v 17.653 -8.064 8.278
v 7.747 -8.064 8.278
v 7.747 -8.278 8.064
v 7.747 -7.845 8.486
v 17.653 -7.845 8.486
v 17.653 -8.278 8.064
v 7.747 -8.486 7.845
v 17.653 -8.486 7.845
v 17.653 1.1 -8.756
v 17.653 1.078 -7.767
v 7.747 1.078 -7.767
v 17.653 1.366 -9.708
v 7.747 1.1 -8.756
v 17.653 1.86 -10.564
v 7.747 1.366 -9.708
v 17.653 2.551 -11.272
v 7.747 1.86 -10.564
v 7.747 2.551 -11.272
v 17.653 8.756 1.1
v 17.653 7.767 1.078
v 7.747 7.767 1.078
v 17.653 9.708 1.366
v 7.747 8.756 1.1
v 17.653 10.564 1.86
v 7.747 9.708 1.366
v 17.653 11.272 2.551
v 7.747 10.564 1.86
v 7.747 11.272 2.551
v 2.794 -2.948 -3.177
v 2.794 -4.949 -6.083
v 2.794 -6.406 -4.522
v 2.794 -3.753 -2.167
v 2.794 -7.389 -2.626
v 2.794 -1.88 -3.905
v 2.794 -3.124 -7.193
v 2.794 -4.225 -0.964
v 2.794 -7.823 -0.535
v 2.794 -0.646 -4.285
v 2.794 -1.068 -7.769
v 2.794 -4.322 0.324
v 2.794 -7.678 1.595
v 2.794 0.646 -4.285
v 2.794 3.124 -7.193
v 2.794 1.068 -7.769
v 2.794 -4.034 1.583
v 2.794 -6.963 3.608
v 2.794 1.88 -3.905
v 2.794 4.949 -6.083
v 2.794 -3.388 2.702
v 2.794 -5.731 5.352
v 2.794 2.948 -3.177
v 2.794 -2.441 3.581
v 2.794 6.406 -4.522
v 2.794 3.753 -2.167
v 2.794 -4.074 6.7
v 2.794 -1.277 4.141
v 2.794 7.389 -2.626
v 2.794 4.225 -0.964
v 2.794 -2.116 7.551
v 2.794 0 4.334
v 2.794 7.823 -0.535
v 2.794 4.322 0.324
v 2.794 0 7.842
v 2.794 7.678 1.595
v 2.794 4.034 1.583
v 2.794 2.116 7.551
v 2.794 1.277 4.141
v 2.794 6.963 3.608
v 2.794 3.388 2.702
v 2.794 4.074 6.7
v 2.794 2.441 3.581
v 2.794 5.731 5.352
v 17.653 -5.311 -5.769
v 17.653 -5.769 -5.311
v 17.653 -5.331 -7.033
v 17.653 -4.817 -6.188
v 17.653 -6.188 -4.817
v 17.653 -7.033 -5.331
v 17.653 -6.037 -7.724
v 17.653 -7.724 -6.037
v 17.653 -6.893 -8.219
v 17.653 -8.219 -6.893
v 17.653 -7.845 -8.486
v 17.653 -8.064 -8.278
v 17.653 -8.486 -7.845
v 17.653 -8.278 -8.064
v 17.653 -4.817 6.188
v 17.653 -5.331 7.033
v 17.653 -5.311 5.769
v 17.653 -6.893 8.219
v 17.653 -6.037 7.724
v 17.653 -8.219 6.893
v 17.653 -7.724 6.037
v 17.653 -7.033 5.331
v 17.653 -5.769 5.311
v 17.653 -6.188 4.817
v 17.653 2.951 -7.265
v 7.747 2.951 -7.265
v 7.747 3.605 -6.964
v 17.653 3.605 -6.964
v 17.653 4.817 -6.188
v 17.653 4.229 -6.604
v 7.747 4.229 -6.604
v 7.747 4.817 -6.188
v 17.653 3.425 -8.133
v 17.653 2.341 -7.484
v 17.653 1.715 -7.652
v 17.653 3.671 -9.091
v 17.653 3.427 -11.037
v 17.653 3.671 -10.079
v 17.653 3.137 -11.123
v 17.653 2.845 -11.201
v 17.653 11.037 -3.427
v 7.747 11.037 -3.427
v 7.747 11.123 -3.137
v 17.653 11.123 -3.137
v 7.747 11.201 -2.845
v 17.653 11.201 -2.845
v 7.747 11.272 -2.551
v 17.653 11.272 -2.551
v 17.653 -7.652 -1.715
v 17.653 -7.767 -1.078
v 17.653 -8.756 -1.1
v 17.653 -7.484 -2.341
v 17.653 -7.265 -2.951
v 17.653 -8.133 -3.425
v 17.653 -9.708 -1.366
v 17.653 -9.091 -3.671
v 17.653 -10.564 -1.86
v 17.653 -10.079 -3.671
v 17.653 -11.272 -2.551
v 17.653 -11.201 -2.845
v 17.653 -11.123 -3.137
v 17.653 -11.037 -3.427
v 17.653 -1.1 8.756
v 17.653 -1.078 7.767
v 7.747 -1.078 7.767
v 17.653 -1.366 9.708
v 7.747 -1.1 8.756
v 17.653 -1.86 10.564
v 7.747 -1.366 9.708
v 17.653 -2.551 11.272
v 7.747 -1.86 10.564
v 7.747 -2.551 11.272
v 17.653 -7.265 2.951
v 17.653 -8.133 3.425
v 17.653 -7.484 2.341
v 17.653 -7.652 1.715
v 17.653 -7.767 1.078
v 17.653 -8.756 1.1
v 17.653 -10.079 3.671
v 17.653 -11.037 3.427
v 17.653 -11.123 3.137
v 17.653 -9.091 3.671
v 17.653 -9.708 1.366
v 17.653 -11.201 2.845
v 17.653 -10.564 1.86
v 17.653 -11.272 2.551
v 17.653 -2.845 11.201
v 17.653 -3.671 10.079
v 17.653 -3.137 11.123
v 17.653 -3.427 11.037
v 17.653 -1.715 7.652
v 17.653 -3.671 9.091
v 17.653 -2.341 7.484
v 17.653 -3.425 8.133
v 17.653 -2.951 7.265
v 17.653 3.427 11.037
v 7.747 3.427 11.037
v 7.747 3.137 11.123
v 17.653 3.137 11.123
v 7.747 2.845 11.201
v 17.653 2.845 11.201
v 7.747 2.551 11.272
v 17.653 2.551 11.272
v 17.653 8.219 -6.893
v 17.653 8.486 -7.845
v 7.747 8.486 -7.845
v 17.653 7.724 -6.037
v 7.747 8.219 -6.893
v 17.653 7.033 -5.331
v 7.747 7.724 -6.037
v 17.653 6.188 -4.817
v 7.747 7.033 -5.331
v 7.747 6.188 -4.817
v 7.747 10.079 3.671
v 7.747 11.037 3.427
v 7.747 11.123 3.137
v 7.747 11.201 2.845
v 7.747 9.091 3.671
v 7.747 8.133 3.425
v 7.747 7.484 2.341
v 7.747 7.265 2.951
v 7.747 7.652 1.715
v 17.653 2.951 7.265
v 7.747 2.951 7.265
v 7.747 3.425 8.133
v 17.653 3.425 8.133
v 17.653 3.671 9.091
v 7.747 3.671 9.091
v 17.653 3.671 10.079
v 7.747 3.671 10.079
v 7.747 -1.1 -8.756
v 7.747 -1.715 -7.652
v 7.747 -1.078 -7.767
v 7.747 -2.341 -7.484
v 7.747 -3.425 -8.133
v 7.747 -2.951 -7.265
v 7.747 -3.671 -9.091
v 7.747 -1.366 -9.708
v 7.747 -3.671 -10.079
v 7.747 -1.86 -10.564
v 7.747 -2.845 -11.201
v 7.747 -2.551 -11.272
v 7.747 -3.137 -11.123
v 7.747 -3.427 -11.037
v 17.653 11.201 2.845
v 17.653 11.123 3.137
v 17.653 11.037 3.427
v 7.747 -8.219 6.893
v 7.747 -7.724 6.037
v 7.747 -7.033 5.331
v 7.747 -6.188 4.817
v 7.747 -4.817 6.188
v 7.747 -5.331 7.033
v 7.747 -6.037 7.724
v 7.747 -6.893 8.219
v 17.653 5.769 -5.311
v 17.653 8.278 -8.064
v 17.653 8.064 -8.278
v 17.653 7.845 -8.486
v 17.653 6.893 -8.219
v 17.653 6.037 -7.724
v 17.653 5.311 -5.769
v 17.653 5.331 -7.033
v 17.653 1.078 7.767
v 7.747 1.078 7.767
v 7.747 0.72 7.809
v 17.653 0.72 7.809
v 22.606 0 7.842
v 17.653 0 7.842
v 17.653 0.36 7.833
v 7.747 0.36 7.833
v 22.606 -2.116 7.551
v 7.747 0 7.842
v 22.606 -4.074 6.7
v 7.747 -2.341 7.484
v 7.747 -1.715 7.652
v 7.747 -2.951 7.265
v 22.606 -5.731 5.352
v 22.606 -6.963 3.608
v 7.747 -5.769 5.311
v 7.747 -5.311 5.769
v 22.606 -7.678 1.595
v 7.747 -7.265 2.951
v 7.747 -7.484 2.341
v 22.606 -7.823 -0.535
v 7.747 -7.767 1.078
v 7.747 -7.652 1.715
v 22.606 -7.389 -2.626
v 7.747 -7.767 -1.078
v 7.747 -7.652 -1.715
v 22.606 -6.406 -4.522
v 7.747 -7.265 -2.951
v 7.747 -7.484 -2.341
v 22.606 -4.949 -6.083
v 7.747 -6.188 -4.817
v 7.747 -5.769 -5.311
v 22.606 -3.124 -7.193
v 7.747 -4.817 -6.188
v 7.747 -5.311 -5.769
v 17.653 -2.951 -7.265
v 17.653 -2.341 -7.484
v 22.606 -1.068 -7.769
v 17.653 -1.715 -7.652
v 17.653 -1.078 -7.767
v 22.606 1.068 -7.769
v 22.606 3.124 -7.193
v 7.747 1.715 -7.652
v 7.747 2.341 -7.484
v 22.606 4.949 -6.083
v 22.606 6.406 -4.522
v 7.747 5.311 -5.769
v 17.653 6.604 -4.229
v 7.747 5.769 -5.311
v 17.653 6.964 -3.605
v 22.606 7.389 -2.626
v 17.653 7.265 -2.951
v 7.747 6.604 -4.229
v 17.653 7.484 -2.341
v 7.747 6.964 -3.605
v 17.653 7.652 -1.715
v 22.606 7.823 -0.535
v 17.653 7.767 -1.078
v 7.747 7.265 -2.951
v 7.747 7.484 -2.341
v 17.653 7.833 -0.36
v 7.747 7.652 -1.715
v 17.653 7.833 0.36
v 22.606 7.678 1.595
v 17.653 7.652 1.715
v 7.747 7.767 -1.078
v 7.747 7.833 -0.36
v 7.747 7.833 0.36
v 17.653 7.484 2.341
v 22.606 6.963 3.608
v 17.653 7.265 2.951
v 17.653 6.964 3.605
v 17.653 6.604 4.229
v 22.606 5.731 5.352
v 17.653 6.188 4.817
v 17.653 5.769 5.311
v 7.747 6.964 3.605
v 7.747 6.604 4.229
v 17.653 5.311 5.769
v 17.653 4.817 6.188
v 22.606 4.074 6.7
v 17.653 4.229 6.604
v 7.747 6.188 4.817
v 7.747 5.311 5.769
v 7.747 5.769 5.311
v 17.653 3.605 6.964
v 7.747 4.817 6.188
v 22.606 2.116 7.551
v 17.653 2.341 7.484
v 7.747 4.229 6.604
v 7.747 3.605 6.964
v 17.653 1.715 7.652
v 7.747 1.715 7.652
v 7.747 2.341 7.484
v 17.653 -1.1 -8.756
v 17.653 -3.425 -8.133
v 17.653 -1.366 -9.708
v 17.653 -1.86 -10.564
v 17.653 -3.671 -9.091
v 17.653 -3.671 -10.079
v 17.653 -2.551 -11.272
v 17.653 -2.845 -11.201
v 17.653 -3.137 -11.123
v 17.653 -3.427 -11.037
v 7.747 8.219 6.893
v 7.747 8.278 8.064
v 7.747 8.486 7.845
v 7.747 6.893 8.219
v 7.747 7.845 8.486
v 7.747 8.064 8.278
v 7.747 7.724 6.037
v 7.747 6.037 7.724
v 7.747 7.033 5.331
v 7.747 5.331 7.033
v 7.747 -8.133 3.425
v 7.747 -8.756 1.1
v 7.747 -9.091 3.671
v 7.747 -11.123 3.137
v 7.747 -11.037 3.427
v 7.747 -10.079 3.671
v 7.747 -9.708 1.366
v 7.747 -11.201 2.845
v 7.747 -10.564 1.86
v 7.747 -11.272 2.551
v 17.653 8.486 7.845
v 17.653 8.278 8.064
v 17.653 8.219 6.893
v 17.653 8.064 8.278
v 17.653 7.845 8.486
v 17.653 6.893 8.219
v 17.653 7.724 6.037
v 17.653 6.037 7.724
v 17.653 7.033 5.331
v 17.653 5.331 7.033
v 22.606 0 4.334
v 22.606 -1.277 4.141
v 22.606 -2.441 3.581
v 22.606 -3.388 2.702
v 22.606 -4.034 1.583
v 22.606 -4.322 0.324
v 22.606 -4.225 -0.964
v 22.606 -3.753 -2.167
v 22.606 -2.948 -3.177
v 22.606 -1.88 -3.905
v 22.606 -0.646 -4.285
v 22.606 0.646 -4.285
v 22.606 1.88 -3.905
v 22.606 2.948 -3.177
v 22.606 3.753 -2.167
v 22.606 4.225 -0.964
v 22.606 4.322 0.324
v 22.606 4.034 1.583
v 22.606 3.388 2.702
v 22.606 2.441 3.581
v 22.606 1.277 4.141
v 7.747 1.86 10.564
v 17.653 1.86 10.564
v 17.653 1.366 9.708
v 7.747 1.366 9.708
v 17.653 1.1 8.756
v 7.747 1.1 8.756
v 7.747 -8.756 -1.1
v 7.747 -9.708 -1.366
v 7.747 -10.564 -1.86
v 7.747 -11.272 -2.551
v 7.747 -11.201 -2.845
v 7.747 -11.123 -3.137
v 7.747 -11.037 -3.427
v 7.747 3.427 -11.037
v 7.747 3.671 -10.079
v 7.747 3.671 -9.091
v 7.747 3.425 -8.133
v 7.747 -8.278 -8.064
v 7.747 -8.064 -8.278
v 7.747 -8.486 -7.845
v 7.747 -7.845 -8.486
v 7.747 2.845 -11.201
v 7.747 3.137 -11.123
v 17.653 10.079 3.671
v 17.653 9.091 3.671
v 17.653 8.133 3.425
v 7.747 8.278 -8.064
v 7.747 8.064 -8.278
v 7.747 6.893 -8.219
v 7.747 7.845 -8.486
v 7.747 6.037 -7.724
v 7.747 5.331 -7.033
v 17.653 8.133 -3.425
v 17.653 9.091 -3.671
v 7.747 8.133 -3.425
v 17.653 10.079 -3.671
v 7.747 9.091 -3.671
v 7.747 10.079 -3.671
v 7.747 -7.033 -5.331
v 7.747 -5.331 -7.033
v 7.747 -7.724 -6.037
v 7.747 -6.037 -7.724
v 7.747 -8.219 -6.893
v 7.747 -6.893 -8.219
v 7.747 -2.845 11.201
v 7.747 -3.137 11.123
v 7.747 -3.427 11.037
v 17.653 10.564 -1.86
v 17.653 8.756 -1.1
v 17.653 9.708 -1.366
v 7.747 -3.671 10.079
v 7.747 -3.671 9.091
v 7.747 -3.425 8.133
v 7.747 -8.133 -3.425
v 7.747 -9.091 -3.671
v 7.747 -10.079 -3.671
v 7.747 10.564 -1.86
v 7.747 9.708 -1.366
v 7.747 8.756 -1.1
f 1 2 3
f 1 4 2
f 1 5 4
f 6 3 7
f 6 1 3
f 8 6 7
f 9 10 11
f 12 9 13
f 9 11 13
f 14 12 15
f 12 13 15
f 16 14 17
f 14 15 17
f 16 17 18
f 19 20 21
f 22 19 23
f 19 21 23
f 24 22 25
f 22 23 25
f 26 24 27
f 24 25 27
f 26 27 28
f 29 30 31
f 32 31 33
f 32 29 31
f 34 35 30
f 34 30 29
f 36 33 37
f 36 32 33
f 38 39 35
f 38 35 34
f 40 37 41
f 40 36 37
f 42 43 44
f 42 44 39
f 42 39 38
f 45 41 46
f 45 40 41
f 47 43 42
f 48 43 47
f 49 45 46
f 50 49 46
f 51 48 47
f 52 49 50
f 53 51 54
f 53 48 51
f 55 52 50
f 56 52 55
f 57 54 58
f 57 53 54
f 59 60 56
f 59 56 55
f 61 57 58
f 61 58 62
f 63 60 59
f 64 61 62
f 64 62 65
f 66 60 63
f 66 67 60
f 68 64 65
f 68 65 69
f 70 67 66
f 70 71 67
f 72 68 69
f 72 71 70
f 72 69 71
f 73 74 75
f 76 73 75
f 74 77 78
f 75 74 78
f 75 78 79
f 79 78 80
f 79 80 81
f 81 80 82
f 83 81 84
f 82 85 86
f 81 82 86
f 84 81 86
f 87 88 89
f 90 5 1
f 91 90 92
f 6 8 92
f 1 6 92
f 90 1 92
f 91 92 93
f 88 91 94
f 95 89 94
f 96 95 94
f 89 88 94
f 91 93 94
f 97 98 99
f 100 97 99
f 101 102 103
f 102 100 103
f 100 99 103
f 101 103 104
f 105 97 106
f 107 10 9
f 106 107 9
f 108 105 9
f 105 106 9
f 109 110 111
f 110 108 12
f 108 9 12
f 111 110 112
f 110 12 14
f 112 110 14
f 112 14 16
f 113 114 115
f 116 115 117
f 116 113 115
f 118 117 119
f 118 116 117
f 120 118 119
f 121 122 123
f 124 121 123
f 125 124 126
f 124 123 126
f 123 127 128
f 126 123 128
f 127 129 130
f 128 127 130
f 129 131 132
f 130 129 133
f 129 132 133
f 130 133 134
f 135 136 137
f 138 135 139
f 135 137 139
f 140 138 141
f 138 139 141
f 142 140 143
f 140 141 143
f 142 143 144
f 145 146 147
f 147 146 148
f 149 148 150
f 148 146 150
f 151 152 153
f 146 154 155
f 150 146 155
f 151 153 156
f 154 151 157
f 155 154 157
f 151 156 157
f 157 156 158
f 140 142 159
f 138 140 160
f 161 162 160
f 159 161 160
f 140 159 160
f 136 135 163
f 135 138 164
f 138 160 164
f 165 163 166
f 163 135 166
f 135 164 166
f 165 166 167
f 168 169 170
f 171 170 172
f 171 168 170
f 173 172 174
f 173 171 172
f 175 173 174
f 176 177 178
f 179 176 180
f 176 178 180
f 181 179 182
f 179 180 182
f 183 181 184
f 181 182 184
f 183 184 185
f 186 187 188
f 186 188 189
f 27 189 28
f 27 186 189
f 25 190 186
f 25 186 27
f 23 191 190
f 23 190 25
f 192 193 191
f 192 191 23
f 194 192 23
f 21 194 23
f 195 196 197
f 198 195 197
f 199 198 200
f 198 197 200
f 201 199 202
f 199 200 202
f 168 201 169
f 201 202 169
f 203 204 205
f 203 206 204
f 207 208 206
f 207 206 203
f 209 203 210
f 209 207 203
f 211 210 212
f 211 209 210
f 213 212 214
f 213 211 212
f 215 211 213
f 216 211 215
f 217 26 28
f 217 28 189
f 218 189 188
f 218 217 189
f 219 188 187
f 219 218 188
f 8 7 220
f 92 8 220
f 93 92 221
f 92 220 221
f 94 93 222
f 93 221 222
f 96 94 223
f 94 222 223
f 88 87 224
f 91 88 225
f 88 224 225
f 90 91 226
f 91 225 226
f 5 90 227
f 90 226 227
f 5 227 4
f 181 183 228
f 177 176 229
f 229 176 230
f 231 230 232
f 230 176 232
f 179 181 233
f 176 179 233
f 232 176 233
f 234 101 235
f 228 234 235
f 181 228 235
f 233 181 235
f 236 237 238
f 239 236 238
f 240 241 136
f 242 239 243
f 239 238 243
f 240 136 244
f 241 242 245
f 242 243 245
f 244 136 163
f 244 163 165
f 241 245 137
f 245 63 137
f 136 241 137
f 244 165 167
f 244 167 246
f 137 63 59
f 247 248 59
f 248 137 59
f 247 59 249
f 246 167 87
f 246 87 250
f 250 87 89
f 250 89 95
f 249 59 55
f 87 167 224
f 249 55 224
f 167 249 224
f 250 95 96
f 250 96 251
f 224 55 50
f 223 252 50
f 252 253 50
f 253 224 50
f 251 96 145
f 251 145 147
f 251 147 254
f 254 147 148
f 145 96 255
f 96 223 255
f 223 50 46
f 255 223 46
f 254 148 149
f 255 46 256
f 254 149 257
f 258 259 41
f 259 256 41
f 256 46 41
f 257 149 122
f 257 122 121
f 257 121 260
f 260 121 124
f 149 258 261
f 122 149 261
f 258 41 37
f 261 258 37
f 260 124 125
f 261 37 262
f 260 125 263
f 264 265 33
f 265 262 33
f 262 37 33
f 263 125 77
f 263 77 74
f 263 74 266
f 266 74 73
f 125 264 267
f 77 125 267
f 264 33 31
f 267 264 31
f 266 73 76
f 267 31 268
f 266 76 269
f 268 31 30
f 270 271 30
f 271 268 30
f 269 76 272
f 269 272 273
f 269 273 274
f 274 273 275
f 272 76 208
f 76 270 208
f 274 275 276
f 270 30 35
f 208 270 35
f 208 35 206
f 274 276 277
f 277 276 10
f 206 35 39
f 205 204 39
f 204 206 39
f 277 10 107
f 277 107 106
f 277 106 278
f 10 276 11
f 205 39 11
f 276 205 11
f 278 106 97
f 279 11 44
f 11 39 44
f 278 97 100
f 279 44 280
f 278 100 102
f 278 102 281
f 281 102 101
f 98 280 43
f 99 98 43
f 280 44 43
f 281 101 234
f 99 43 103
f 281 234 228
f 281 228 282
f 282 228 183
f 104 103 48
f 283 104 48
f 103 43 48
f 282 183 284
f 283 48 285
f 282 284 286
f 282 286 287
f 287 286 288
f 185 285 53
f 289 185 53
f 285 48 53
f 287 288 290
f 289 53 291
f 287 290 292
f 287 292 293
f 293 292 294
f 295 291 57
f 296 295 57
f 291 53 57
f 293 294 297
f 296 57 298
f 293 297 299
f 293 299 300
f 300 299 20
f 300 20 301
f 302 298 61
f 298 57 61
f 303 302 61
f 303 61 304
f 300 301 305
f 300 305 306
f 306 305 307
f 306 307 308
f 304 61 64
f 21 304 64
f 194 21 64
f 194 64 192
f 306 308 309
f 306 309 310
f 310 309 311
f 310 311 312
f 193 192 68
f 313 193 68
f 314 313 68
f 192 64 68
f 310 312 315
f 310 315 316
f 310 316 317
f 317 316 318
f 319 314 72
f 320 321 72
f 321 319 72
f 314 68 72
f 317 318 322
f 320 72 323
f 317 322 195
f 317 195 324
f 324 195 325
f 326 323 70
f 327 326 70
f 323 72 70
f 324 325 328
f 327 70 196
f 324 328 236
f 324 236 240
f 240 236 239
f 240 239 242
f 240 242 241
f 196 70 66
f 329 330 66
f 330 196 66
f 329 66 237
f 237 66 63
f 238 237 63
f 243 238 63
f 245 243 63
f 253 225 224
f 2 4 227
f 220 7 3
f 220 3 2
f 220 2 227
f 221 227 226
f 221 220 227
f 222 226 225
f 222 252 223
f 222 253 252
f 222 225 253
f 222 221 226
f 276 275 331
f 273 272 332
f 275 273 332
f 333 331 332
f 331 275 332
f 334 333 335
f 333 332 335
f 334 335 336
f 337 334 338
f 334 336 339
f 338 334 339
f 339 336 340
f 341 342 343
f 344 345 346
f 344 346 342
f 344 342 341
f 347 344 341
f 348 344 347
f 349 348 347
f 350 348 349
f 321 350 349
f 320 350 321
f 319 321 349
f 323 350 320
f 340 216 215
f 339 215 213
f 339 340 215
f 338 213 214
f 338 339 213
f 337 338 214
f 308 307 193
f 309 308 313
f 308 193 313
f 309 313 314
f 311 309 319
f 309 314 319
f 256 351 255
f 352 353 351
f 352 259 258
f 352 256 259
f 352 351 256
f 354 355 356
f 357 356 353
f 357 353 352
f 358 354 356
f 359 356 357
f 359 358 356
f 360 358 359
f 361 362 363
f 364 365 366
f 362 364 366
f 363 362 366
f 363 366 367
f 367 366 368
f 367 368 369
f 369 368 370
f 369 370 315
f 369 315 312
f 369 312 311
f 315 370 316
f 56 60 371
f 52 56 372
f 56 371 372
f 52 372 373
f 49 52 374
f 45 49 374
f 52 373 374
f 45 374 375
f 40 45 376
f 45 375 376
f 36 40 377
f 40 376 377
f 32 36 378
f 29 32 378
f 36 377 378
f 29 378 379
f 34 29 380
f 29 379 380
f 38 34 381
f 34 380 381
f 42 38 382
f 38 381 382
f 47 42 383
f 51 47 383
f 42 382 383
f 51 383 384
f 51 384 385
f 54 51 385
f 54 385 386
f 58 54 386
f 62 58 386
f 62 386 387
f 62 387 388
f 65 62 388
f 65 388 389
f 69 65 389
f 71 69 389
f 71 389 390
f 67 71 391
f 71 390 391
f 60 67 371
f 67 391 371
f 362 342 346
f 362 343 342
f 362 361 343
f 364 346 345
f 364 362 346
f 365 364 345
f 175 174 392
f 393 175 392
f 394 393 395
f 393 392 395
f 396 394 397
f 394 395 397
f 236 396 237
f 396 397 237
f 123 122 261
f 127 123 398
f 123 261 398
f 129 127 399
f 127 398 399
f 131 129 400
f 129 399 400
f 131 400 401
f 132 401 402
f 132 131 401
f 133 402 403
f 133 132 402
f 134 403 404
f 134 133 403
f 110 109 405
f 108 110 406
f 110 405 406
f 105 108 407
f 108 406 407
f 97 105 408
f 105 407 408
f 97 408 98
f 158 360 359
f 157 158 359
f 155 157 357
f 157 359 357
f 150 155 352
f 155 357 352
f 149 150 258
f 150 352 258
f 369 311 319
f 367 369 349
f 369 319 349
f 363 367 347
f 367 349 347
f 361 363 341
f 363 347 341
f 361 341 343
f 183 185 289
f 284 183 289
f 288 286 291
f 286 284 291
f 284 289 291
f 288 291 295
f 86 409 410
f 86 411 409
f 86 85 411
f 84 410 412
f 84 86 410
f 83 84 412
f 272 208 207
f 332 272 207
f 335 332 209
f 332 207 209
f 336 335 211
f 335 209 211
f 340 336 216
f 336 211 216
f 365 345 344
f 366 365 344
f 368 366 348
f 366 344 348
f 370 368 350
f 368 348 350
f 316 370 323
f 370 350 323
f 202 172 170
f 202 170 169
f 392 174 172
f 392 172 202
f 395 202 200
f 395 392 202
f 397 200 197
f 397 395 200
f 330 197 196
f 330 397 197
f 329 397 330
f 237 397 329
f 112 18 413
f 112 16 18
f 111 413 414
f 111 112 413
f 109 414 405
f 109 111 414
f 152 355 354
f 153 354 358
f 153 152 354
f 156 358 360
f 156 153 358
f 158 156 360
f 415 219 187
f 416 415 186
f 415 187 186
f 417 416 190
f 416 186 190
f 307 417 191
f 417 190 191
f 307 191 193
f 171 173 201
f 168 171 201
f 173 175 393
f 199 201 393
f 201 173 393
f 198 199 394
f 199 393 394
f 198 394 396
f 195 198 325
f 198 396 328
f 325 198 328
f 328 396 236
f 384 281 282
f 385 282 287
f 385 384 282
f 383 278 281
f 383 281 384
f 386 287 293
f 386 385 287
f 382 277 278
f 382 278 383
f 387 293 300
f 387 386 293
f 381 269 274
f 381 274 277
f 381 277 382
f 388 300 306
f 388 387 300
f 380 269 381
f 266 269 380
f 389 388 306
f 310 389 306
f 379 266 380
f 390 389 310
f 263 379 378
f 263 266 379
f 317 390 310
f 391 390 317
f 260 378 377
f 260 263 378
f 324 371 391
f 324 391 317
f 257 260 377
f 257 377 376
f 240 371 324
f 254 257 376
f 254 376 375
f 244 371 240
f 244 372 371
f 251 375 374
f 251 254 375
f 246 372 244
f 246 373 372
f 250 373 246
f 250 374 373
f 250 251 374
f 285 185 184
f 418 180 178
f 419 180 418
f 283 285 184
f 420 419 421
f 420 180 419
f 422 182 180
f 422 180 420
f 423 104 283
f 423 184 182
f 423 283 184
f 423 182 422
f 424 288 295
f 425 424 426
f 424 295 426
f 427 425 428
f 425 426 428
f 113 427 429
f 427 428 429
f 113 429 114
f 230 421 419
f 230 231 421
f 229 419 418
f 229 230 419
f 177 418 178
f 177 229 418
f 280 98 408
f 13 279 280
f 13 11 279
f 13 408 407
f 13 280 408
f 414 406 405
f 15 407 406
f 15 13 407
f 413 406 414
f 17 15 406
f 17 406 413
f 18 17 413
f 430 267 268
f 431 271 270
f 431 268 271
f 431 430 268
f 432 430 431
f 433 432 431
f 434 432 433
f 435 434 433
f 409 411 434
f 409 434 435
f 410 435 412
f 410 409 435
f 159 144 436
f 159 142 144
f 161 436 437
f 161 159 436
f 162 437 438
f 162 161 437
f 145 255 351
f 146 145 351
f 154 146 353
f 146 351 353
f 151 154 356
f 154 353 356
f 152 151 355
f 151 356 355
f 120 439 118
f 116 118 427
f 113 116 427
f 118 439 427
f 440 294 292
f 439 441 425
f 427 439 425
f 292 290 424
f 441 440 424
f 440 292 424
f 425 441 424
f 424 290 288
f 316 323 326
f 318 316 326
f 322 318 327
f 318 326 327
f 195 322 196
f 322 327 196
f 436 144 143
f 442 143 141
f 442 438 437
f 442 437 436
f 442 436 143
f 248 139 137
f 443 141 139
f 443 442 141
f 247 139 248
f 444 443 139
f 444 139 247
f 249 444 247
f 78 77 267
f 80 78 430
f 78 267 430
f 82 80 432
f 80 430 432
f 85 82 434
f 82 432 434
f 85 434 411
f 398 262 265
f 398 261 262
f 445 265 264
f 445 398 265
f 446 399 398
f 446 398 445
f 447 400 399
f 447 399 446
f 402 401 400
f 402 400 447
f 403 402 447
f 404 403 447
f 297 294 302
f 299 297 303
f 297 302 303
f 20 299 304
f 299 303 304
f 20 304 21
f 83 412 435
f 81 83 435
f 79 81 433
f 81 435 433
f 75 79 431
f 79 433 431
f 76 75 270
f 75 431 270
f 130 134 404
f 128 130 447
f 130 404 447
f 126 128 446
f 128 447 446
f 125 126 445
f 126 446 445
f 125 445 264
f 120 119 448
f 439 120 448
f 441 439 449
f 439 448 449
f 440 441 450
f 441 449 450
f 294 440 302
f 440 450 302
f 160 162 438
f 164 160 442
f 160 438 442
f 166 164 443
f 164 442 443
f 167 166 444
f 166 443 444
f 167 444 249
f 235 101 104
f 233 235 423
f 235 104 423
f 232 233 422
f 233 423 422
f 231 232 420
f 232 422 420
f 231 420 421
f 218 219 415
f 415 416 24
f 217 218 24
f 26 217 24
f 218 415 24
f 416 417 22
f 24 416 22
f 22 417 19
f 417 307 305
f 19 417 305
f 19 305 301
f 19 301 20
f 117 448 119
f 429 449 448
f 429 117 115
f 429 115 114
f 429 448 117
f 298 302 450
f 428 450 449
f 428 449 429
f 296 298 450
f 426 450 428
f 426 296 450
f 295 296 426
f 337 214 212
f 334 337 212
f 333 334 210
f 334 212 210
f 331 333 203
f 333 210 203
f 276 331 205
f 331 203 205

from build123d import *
from build123d.topology import SkipClean

# Parameters (mm, degrees)
BASPROSKE_W       = 25.4
BASPROSKE_H       = 29.633333333
TOOTHCUT_DEPTH    = 50.004376222
TEETHCUTS_COUNT   = 12
TEETHCUTS_ANGLE   = 330
HUBNEABOTSKE_R    = 20.107063333
HUBNEARBOTH_DEPTH = 12.7000254
HUBFARSKE_R       = 20.107063333
HUBFAR_DEPTH      = 12.7000254
BORSKE_R          = 11.1125
BORE_DEPTH        = 50.8000508
SCALE1_SCALE      = 0.39


with BuildPart() as part:
    # BasProSke → Base-Revolve (revolve)
    with BuildSketch(Plane(origin=(0, 0, 0), x_dir=(1, 0, 0), z_dir=(0, 1, 0)), mode=Mode.PRIVATE) as base_revolve_sk:
        with Locations((12.7, 14.816666667)):
            Rectangle(BASPROSKE_W, BASPROSKE_H)
    revolve(base_revolve_sk.sketch.rotate(Axis((-10, 0, 0), (1, 0, 0)), 180), axis=Axis((-10, 0, 0), (1, 0, 0)))

    # TooCutSke → ToothCut (cut, through all)
    with BuildSketch(Plane(origin=(0, 0, 0), x_dir=(0, 0, -1), z_dir=(1, 0, 0))):
        with BuildLine():
            ThreePointArc((2.76285054, 19.91634135), (0, 20.107063333), (-2.76285054, 19.91634135))
            ThreePointArc((-2.76285054, 19.91634135), (-3.510108668, 24.907095847), (-6.566398379, 28.922705186))
            ThreePointArc((-6.566398379, 28.922705186), (0, 29.658733333), (6.566398379, 28.922705186))
            ThreePointArc((6.566398379, 28.922705186), (3.510108668, 24.907095847), (2.76285054, 19.91634135))
        make_face()
    toothcut = extrude(amount=TOOTHCUT_DEPTH, mode=Mode.SUBTRACT)

    # TeethCuts: ToothCut ×12 about axis
    teethcuts_axis = Axis((-10, 0, 0), (1, 0, 0))
    for i in range(1, TEETHCUTS_COUNT):
        add(toothcut.rotate(teethcuts_axis, i * TEETHCUTS_ANGLE / (TEETHCUTS_COUNT - 1)), mode=Mode.SUBTRACT)

    # HubNeaBotSke → HubNearBoth (add)
    with SkipClean():  # the faces are left unmerged after this step: merging them gives an invalid solid
        with BuildSketch(Plane.ZY):
            Circle(HUBNEABOTSKE_R)
        extrude(amount=HUBNEARBOTH_DEPTH)

    # HubFarSke → HubFar (add)
    with SkipClean():  # the faces are left unmerged after this step: merging them gives an invalid solid
        with BuildSketch(Plane(origin=(25.4, 0, 0), x_dir=(0, 0, -1), z_dir=(1, 0, 0))):
            with Locations(Location((0, 0, 0), (0, 0, 180))):
                Circle(HUBFARSKE_R)
        extrude(amount=HUBFAR_DEPTH)

    # BorSke → Bore (cut, symmetric)
    with SkipClean():  # the faces are left unmerged after this step: merging them gives an invalid solid
        with BuildSketch(Plane(origin=(0, 0, 0), x_dir=(0, 0, -1), z_dir=(1, 0, 0))):
            with Locations(Location((0, 0, 0), (0, 0, 180))):
                Circle(BORSKE_R)
        extrude(amount=BORE_DEPTH, both=True, mode=Mode.SUBTRACT)


with BuildPart() as part_1:
    # Scale1: scaled about (12.7, 0, 0)
    add(part.part.scale(SCALE1_SCALE).moved(Location((7.747, 0, 0))))


solid = part_1.part
